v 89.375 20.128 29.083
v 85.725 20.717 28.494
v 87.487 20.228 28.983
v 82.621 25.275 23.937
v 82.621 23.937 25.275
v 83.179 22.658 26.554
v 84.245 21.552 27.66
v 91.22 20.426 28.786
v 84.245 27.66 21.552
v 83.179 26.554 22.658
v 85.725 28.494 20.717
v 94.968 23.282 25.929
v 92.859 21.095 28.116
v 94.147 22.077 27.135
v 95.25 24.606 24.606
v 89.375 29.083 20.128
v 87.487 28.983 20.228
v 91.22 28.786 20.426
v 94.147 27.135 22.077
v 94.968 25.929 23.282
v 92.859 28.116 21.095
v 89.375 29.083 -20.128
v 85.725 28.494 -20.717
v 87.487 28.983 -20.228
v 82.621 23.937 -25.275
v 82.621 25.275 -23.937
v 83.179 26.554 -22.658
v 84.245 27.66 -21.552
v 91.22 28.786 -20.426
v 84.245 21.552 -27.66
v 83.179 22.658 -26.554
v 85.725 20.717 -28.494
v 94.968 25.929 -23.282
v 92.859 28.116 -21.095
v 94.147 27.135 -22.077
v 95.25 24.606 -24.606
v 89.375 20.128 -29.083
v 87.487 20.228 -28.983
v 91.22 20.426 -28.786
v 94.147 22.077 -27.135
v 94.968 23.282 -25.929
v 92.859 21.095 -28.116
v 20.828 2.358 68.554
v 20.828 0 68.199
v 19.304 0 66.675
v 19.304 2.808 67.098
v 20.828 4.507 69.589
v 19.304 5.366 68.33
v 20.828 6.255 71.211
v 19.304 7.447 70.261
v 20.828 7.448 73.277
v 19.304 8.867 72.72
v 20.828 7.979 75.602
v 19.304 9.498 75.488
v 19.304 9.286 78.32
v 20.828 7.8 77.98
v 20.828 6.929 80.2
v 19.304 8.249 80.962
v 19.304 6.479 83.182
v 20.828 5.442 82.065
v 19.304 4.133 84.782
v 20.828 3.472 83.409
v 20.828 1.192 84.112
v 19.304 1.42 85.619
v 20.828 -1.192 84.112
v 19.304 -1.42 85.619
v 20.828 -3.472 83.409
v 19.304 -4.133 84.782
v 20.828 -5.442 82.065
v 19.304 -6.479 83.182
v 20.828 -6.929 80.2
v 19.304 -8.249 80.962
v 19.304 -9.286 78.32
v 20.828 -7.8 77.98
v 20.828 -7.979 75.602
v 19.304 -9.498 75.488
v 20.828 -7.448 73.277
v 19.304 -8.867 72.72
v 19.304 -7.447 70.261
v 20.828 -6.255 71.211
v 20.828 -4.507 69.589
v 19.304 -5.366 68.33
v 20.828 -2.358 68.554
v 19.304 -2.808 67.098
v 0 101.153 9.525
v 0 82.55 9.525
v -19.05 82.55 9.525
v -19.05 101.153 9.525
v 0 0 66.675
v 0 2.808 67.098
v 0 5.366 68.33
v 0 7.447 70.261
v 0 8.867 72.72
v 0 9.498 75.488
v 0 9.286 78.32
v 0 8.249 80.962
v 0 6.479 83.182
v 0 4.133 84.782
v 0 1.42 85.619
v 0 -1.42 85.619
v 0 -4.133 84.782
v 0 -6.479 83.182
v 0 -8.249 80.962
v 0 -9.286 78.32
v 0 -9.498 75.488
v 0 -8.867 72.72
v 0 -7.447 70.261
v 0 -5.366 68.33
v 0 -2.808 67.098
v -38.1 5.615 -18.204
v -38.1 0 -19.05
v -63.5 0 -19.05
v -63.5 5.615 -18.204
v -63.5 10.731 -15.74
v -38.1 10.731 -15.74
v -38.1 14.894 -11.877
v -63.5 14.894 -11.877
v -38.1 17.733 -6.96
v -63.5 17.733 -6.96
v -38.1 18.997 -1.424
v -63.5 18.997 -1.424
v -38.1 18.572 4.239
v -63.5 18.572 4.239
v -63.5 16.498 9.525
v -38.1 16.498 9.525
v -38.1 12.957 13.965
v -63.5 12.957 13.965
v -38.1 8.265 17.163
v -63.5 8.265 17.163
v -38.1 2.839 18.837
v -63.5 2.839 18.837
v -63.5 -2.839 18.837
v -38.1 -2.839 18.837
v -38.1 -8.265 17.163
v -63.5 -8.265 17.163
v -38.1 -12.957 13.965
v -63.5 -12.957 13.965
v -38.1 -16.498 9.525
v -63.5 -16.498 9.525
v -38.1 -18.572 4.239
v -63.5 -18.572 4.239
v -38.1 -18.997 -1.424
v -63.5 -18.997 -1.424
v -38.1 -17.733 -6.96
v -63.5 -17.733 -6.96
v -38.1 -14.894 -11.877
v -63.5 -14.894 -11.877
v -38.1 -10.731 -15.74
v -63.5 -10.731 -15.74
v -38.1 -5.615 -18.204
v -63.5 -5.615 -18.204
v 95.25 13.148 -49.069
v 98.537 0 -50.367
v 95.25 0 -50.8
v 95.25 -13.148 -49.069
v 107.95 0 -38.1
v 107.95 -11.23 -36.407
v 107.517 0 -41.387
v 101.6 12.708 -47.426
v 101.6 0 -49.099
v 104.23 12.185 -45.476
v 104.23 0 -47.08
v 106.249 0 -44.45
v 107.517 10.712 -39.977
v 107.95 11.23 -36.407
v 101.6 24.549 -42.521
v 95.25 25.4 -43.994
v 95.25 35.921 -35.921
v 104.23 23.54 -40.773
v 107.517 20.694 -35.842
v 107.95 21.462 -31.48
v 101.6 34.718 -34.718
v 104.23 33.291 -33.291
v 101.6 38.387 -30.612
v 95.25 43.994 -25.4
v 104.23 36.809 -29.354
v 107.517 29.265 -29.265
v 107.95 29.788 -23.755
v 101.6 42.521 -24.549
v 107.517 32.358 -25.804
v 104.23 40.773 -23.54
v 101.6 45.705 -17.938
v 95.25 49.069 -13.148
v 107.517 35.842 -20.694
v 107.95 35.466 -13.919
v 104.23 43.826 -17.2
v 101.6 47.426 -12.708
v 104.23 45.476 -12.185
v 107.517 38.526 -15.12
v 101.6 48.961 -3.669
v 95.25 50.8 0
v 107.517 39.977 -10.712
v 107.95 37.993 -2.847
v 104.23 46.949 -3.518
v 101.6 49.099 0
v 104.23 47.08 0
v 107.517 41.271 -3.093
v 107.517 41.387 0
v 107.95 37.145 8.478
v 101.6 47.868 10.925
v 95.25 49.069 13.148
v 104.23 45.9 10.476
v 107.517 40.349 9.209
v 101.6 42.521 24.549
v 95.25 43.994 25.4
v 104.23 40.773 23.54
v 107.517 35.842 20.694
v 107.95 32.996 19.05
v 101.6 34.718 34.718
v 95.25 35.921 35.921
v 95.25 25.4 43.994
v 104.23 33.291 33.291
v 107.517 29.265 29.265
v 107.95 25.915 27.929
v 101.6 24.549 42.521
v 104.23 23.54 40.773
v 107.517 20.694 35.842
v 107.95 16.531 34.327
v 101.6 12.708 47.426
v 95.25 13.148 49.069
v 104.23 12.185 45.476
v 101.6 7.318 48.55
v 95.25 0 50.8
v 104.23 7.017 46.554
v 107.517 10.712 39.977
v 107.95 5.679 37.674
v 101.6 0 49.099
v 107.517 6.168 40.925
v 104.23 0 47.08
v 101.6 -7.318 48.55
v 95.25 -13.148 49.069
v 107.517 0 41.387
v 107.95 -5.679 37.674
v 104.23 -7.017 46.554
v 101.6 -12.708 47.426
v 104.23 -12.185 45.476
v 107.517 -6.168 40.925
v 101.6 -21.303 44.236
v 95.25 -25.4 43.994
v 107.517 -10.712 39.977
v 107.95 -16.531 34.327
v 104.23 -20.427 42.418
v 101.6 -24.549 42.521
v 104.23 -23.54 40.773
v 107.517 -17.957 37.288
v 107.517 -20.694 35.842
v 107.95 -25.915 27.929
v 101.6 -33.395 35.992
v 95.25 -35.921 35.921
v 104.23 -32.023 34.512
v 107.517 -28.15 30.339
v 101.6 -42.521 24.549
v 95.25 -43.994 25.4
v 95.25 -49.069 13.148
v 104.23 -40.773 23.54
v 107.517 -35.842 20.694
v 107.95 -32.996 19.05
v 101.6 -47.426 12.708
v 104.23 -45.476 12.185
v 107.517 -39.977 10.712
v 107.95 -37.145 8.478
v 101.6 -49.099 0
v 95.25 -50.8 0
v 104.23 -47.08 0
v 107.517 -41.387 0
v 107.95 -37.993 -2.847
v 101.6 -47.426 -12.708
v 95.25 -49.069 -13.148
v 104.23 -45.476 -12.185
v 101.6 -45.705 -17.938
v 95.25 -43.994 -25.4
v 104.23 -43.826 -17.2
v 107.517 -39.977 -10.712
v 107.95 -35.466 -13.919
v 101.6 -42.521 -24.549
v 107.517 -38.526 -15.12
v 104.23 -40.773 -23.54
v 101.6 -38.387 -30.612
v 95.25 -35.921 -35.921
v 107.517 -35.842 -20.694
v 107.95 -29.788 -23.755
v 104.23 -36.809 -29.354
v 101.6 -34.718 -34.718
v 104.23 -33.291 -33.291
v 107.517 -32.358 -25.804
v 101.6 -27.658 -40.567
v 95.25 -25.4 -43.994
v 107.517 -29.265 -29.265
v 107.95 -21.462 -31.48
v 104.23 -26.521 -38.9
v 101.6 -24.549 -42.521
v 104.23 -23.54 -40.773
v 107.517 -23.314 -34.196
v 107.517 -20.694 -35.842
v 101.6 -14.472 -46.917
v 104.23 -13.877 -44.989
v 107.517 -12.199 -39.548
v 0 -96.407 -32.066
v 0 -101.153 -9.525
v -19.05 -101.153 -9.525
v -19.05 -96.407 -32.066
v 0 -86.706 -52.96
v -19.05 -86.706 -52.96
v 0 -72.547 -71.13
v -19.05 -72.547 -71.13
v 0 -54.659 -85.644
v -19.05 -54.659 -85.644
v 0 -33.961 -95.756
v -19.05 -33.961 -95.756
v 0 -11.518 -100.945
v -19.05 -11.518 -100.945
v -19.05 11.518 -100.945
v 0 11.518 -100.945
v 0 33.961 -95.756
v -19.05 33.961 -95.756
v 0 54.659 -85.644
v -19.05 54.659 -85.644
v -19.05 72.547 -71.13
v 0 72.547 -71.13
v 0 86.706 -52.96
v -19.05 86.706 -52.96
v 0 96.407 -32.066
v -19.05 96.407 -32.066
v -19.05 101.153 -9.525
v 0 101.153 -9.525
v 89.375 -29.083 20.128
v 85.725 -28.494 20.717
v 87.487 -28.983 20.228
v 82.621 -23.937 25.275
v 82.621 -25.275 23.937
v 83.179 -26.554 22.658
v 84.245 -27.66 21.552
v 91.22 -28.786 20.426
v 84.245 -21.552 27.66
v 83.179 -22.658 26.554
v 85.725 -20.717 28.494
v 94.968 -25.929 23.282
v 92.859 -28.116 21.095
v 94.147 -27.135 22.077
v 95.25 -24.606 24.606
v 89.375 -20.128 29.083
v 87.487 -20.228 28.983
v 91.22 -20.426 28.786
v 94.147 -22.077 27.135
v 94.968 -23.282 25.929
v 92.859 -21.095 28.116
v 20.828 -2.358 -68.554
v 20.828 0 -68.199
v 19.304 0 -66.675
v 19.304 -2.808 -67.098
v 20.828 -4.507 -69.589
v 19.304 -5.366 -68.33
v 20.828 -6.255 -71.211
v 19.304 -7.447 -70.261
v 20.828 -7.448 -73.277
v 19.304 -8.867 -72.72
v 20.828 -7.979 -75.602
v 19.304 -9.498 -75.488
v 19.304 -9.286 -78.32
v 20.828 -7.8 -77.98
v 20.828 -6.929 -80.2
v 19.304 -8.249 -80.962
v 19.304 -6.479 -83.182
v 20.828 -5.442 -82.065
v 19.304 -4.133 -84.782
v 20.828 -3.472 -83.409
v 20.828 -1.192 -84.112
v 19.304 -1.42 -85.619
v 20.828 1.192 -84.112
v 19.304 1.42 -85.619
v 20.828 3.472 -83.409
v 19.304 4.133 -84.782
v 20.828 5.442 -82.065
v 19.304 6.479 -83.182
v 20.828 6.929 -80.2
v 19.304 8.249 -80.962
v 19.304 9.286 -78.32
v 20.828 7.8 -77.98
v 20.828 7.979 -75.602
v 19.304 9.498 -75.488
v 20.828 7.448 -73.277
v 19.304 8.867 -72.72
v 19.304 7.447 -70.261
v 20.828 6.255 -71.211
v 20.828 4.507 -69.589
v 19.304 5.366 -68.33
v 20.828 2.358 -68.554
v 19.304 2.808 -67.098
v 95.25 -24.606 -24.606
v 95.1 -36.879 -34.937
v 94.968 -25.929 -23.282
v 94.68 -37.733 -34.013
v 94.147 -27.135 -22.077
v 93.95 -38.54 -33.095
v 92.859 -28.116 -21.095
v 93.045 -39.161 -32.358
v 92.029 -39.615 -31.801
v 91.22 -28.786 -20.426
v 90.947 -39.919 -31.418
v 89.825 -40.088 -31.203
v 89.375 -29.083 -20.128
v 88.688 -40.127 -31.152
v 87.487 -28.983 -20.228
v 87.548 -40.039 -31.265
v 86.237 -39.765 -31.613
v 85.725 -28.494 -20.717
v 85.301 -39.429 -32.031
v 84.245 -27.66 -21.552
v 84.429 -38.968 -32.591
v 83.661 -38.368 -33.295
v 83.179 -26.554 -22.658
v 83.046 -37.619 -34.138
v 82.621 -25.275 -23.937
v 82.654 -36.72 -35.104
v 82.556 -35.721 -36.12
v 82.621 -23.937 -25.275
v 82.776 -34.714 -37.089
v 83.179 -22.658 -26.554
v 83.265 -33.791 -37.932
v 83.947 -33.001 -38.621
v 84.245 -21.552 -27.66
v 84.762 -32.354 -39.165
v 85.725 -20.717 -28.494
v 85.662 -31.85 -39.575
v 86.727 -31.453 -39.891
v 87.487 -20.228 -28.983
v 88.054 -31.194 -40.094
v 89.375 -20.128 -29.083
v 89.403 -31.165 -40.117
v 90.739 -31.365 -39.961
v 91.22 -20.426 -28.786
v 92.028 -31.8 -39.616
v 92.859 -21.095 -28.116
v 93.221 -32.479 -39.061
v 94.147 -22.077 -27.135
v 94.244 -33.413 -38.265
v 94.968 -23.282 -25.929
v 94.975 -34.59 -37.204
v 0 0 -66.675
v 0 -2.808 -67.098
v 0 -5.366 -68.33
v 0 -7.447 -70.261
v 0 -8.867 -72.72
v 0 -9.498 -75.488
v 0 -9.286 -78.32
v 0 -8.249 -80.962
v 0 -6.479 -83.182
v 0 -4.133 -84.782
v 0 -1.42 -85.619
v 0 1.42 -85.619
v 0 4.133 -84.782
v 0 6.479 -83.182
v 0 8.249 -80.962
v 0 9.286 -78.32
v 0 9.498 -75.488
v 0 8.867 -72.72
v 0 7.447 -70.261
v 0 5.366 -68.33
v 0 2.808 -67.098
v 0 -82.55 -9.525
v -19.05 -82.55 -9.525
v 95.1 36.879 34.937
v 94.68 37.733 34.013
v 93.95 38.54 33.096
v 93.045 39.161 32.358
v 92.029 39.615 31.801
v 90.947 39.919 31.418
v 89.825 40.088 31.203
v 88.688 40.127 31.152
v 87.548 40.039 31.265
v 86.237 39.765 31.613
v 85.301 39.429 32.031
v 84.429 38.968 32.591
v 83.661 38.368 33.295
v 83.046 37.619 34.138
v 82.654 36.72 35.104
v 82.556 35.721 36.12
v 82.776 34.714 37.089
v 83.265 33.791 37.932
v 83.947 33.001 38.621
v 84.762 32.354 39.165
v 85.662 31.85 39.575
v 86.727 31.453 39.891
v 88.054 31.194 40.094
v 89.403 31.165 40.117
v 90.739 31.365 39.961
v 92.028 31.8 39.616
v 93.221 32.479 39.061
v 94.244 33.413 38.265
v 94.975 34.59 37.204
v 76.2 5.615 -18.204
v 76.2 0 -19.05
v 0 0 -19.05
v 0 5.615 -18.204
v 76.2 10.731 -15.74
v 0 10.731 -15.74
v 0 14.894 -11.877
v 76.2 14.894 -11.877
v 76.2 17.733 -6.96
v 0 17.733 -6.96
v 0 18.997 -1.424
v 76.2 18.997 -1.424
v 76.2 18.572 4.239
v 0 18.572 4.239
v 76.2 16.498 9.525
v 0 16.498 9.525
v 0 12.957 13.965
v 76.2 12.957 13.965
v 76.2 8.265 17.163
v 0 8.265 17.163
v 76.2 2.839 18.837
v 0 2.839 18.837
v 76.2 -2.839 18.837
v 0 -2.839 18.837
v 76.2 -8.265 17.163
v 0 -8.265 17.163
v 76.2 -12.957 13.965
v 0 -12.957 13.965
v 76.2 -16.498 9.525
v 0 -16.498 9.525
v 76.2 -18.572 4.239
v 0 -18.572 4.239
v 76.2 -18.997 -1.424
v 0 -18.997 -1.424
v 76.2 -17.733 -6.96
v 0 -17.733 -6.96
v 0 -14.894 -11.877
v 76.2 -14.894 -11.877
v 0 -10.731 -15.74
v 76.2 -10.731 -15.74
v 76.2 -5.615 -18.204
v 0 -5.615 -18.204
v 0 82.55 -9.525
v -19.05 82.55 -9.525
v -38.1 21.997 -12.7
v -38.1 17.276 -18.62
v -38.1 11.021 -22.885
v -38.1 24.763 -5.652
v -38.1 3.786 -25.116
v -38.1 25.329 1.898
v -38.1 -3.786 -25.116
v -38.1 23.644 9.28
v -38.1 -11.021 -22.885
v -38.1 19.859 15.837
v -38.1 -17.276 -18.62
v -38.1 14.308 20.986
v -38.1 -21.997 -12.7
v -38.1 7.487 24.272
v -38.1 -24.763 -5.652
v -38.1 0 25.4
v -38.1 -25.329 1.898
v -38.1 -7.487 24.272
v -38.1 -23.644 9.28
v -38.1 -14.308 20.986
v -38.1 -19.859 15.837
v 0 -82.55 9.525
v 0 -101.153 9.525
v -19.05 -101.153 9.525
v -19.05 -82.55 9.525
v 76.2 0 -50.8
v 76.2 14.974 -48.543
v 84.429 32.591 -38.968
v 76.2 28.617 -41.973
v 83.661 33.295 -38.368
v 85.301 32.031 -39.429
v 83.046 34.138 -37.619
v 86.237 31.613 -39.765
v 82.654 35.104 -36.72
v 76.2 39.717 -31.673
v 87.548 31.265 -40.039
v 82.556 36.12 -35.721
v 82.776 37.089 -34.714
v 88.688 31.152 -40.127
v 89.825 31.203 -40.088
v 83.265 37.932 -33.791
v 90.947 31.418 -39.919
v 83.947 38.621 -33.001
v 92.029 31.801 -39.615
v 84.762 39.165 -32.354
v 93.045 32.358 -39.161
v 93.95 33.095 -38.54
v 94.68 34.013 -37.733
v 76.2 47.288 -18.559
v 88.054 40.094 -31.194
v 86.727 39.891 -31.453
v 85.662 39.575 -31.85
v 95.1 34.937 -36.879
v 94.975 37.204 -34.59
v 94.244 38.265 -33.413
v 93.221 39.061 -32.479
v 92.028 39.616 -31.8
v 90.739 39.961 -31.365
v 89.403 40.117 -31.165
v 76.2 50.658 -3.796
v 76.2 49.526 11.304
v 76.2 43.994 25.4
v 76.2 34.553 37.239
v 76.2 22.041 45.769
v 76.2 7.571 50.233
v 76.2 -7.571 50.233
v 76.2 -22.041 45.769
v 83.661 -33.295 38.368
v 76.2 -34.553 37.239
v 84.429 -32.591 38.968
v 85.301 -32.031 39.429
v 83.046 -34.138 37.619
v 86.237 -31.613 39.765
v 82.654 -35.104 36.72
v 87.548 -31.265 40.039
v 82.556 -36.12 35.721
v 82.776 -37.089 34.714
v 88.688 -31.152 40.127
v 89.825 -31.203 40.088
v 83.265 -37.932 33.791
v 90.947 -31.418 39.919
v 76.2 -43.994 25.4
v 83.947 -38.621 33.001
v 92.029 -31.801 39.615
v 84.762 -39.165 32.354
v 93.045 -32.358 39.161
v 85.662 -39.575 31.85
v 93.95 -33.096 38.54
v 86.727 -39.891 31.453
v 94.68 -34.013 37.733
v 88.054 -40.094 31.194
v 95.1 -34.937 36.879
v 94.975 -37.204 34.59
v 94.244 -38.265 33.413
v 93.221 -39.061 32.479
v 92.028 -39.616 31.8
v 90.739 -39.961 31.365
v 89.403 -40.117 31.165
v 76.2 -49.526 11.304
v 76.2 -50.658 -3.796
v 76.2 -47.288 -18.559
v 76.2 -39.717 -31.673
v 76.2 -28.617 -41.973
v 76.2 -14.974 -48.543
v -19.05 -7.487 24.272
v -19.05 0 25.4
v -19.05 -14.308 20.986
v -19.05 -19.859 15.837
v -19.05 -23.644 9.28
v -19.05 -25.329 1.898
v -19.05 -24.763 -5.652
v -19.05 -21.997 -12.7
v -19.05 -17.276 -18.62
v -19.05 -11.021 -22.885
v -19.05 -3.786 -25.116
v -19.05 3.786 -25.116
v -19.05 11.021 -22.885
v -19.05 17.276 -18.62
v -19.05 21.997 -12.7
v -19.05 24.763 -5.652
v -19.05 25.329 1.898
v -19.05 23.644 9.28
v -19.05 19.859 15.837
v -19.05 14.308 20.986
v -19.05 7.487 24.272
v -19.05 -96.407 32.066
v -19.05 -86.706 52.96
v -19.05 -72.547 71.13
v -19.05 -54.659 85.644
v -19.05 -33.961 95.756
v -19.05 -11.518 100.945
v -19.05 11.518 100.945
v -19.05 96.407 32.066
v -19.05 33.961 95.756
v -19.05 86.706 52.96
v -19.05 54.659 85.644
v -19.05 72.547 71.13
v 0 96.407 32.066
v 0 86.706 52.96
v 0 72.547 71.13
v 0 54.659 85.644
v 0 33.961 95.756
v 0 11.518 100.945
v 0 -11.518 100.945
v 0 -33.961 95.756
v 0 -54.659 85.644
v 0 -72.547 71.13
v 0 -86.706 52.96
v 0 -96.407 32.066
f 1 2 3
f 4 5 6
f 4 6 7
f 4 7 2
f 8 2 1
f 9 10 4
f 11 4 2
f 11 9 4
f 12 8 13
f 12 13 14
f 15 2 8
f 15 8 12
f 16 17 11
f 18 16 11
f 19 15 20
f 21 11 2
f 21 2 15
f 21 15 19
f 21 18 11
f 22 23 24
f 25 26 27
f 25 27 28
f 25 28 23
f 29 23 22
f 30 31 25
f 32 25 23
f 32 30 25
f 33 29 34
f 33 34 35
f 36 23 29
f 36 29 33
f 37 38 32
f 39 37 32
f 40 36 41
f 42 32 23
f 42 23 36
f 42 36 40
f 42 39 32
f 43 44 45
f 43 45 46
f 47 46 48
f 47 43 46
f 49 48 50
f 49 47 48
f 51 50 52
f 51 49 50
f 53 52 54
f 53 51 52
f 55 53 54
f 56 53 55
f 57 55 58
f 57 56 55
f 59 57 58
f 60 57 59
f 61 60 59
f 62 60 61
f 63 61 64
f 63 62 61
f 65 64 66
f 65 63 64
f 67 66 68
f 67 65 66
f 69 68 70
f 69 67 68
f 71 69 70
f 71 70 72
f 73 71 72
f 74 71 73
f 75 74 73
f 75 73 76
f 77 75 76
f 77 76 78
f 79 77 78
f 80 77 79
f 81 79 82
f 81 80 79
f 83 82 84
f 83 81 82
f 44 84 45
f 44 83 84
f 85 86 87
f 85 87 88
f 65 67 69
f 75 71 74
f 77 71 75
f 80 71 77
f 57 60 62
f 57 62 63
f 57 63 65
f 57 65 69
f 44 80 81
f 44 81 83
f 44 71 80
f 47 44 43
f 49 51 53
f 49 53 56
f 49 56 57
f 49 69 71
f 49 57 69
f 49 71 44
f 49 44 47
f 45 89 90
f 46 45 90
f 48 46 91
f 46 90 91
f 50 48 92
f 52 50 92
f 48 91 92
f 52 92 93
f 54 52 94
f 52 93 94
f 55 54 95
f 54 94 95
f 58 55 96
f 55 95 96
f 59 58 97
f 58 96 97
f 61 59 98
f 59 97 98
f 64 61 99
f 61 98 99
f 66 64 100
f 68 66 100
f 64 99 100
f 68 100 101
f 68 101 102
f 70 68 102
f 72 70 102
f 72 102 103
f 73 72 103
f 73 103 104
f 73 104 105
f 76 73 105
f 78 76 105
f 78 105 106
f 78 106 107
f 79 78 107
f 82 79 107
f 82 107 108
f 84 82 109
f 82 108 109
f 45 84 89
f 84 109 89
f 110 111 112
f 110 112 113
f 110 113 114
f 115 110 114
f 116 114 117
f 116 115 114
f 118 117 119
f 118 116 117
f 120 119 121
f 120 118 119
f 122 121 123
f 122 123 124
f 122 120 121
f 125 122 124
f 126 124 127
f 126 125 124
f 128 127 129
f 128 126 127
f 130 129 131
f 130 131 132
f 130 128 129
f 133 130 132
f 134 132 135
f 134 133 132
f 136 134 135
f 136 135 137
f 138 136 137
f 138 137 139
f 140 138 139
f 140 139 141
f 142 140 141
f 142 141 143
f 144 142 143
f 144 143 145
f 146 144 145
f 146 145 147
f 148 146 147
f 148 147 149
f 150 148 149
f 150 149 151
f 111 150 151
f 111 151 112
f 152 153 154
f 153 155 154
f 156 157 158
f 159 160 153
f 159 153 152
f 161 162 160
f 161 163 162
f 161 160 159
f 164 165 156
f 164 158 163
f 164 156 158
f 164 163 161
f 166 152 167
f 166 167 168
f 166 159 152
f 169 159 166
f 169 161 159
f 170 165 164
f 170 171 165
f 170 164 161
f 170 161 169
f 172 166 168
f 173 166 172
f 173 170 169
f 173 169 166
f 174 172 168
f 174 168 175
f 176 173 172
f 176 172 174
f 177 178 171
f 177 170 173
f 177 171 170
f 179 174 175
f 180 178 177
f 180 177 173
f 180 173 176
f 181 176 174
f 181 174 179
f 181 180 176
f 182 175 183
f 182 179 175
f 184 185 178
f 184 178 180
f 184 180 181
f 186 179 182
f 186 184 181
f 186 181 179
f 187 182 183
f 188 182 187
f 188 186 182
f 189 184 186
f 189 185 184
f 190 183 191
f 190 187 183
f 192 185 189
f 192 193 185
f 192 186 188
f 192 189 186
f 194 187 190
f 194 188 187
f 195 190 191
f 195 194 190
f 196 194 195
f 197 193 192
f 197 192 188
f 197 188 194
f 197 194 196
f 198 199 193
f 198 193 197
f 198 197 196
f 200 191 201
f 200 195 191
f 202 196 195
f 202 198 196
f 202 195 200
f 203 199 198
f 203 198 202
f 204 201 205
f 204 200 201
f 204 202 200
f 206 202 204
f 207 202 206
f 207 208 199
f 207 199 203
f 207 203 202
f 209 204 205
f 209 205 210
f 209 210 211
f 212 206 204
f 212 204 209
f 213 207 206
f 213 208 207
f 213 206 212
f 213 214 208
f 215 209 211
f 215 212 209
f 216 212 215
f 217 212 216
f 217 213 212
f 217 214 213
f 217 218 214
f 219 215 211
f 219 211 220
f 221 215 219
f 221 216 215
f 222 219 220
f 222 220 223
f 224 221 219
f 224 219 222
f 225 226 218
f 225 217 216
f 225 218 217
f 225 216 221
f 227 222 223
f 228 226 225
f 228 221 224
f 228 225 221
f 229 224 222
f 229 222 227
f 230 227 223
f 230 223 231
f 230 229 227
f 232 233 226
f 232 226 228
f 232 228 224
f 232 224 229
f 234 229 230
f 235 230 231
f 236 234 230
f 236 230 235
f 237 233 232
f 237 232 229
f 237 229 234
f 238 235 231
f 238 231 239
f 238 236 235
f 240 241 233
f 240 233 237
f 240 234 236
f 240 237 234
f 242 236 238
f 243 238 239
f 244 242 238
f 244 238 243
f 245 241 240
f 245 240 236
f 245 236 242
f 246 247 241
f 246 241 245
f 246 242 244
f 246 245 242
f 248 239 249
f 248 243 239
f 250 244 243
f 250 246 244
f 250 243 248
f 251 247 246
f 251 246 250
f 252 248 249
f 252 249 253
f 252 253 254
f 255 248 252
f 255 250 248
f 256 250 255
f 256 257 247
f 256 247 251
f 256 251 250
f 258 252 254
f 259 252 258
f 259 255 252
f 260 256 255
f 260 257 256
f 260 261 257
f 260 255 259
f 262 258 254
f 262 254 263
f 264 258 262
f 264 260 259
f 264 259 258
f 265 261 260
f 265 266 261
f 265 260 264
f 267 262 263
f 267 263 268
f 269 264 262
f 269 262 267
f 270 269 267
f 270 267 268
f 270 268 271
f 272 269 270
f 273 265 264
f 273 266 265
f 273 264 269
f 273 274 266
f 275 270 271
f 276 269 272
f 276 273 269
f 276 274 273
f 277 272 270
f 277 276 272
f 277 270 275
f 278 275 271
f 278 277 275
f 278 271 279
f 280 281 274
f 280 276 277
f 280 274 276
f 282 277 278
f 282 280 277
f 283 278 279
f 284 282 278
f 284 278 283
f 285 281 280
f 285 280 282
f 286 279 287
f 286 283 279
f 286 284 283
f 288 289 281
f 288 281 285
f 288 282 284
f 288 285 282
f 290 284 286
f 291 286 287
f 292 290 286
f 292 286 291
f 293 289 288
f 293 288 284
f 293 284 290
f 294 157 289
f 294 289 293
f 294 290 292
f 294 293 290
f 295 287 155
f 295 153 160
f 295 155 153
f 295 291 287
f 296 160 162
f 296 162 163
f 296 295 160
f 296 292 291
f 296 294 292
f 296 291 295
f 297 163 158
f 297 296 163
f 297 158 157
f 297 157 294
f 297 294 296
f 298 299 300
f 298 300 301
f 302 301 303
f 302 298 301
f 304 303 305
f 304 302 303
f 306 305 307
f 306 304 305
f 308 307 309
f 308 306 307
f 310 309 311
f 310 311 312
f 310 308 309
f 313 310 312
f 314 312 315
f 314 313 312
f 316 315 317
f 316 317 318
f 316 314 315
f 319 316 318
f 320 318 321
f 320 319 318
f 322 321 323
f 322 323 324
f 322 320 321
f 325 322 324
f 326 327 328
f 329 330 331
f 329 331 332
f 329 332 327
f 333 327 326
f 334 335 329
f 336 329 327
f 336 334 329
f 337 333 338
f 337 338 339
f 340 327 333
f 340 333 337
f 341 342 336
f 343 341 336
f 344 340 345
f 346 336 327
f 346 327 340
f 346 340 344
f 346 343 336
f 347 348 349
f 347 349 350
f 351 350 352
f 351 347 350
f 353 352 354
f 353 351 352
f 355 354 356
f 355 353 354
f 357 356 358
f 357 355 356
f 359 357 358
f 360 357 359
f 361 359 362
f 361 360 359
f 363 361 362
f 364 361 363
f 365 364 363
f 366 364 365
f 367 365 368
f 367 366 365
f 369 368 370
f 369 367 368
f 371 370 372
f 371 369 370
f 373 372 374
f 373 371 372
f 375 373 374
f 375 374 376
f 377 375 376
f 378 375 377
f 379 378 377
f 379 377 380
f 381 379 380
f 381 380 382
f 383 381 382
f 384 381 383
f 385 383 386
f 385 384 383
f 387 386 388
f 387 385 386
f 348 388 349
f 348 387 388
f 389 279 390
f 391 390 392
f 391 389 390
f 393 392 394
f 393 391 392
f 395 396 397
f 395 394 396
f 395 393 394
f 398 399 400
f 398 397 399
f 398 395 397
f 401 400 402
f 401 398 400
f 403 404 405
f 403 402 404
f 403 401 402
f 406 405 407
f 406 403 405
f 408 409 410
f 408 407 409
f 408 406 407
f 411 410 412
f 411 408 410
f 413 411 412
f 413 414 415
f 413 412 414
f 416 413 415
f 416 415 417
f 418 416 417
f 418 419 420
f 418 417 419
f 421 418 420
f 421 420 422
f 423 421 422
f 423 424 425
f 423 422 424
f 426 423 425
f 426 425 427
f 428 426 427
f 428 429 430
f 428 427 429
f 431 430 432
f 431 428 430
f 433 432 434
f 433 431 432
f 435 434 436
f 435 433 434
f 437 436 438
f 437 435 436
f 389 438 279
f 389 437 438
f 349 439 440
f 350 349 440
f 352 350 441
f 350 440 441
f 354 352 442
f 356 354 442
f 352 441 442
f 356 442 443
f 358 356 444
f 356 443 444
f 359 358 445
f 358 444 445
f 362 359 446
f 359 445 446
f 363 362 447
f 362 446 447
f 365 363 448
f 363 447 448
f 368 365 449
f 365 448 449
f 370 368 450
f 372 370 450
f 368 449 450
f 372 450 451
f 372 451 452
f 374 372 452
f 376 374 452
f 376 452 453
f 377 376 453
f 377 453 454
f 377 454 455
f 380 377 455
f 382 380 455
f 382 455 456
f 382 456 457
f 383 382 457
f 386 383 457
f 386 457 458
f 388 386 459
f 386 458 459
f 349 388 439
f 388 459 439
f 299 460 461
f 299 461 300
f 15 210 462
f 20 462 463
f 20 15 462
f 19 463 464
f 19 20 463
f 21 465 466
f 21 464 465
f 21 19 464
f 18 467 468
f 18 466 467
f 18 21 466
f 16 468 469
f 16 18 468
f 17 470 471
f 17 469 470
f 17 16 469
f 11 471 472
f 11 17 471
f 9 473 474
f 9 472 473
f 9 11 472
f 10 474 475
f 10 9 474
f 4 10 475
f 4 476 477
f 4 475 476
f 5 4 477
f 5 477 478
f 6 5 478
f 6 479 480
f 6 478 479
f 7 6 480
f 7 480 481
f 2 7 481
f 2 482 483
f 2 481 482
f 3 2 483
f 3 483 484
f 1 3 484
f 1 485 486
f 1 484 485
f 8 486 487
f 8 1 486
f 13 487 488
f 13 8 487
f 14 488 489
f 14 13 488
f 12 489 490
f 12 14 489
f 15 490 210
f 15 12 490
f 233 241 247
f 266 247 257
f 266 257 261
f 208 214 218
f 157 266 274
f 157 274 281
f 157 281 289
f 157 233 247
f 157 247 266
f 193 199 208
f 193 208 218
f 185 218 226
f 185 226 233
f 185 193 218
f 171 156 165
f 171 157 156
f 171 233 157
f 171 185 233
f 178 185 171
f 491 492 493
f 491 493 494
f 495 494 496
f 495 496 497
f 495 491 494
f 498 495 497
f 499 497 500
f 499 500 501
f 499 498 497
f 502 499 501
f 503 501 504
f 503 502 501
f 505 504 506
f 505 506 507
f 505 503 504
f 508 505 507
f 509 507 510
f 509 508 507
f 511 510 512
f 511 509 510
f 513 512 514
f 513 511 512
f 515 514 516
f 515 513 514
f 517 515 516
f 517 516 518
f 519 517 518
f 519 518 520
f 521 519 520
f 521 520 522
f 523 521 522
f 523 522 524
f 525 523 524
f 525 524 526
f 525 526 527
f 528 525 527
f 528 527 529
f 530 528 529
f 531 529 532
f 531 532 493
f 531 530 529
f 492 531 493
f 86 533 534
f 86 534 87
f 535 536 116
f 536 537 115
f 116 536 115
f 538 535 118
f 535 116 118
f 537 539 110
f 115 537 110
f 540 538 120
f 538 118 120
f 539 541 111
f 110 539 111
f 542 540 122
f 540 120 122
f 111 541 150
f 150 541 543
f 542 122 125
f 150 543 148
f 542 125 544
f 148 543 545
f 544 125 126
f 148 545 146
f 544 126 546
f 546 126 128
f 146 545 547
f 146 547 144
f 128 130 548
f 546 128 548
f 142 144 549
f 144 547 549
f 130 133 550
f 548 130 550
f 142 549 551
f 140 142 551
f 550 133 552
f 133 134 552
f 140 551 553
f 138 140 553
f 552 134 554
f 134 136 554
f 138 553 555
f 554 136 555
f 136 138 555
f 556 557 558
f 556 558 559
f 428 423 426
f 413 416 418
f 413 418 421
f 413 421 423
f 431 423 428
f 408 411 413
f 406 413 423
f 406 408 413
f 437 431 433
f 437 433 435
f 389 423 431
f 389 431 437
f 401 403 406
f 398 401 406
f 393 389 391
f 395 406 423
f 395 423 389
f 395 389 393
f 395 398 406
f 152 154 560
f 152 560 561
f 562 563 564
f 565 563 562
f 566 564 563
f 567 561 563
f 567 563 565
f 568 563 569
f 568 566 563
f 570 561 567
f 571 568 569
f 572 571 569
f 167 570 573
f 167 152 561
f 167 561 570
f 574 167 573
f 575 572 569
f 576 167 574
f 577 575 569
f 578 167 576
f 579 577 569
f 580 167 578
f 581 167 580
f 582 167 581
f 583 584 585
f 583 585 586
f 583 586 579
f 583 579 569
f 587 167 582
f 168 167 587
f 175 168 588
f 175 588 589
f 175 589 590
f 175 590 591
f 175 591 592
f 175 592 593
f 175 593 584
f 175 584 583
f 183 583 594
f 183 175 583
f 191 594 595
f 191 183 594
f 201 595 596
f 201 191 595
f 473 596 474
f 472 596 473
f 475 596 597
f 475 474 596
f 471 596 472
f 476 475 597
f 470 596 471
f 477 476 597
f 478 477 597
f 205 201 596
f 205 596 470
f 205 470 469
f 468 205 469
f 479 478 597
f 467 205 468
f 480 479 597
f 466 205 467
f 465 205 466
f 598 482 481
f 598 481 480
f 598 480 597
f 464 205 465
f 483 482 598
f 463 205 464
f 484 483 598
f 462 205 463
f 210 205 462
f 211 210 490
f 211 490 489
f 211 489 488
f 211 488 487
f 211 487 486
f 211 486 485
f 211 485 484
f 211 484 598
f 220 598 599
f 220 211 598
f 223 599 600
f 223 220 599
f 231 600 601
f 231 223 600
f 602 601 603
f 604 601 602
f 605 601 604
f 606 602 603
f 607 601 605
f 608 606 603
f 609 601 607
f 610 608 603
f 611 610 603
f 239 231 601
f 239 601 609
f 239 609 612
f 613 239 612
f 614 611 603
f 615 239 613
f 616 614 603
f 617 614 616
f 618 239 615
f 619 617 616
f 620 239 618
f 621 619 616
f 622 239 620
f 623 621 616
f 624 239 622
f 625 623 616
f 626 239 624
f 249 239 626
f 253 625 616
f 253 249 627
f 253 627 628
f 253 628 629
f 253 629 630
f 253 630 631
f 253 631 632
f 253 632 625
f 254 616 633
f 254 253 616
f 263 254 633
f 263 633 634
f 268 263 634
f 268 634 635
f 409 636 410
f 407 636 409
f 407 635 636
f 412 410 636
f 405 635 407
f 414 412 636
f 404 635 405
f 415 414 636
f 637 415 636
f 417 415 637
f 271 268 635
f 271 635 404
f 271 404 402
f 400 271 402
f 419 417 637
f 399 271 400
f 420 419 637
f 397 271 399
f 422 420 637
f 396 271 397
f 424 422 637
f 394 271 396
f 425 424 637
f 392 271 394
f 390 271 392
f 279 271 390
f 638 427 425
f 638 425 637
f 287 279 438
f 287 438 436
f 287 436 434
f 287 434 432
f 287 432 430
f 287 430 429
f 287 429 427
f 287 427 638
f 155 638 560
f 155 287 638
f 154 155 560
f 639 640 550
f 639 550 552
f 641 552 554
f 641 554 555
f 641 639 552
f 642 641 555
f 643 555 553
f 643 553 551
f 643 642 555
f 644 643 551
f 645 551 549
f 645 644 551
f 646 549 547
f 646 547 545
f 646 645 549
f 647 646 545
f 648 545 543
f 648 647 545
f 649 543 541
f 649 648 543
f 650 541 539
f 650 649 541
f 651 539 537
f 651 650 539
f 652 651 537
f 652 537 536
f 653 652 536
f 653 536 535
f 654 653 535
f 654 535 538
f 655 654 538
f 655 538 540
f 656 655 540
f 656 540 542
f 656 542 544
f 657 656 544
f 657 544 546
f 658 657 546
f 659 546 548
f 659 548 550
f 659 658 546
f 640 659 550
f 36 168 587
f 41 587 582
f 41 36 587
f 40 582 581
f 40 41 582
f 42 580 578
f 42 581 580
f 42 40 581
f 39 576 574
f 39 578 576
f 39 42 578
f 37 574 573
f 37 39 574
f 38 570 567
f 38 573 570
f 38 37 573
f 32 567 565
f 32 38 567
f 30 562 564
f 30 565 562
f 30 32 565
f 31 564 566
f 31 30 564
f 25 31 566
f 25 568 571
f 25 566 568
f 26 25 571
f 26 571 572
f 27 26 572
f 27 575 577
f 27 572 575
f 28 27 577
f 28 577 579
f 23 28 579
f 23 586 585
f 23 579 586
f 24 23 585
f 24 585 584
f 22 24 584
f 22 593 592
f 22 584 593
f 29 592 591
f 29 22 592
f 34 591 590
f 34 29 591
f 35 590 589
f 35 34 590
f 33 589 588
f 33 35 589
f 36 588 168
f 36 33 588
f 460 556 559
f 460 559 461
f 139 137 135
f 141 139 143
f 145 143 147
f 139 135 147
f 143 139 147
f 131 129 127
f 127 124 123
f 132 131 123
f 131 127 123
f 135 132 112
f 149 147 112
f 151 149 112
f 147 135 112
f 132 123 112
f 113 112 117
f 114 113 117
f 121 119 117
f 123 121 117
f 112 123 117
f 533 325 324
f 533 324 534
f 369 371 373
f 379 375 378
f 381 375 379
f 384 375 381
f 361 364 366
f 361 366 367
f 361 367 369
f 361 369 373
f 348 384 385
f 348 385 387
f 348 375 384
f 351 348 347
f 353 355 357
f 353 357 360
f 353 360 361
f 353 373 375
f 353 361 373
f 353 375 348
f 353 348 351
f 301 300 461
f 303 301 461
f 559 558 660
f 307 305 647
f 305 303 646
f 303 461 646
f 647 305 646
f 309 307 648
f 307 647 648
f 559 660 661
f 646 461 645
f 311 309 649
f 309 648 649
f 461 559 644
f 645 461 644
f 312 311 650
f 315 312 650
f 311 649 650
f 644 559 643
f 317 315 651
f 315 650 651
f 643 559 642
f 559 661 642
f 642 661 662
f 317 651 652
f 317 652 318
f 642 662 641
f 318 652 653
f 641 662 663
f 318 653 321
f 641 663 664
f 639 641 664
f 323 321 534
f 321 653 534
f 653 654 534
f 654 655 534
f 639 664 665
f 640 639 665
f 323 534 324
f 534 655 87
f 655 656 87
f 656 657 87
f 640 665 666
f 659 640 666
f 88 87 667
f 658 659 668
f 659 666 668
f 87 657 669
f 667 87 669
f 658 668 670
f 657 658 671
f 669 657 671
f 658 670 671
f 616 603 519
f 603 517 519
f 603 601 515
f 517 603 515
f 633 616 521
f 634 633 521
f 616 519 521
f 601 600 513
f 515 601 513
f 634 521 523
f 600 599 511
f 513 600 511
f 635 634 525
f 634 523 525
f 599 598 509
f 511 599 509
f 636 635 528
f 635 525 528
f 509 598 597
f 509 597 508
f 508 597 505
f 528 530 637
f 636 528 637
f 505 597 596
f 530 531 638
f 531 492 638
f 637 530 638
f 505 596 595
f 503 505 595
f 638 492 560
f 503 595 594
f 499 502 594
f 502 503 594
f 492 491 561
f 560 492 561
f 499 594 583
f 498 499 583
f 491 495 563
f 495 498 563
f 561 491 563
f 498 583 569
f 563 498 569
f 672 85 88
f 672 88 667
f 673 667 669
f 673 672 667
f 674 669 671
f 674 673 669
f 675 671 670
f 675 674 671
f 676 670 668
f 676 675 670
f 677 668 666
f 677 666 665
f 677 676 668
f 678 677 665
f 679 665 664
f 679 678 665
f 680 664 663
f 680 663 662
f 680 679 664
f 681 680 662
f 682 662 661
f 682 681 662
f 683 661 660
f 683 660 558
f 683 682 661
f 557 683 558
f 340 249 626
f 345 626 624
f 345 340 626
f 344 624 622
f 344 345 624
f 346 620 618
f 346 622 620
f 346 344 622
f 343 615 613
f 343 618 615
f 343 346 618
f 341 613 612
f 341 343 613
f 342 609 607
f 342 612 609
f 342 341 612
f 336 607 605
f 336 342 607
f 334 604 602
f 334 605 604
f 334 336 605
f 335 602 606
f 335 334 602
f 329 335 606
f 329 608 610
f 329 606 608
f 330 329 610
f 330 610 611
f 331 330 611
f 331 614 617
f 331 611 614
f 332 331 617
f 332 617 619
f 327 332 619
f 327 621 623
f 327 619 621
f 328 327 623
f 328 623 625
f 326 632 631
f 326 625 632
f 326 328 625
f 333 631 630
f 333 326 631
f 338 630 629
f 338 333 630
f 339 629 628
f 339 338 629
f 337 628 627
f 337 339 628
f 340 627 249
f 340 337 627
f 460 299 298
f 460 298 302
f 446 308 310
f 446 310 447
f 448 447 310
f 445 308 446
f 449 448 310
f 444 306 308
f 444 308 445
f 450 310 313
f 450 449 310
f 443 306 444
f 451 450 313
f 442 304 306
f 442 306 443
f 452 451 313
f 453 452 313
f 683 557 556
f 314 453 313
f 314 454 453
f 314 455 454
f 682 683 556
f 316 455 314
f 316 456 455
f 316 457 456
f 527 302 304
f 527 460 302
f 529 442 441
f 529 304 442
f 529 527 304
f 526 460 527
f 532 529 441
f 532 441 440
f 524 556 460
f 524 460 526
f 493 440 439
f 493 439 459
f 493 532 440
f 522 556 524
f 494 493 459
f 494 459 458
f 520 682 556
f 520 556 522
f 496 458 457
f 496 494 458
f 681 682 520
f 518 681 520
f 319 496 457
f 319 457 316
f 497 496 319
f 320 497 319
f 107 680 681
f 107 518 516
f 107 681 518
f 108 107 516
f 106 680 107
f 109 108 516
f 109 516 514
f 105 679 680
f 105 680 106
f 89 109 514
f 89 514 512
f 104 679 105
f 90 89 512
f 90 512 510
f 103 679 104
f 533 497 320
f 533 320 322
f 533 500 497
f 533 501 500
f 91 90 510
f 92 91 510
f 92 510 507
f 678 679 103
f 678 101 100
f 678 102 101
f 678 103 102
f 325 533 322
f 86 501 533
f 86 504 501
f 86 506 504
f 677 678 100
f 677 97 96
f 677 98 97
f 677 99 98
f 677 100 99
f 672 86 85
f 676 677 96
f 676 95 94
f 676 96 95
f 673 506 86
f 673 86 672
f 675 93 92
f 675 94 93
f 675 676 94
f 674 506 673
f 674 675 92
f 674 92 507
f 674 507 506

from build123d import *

# Parameters (mm, degrees)
BOSS_EXTRUDE1_DEPTH          = 19.05
SKETCH1_3_R                  = 9.525
BOSS_EXTRUDE2_DEPTH          = 20.828
CHAMFER1_SIZE                = 1.524
BOSS_EXTRUDE3_START          = -19.05
SKETCH1_4_R                  = 19.05
BOSS_EXTRUDE3_DEPTH          = 44.45
BOSS_EXTRUDE4_START          = -19.05
SKETCH1_6_R                  = 25.4
SKETCH1_6_R_2                = 19.05
BOSS_EXTRUDE4_DEPTH          = 19.05
BOSS_EXTRUDE5_START          = 76.2
SKETCH1_7_R                  = 19.05
BOSS_EXTRUDE5_DEPTH          = 76.2
BOSS_EXTRUDE6_START          = 107.95
SKETCH1_8_R                  = 50.8
SKETCH1_8_R_2                = 25.4
SKETCH1_8_R_3                = 19.05
BOSS_EXTRUDE6_DEPTH          = 31.75
CIRPATTERN2_COUNT            = 2
CHAMFER1_OF_CIRPATTERN2_SIZE = 1.524
FILLET1_R                    = 12.7
CUT_REVOLVE1_START           = 34.798
CUT_REVOLVE1_OUTLINE_R       = 6.35
CUT_REVOLVE1_DEPTH           = 16.0020001
CIRPATTERN3_COUNT            = 4


# Read off the part's stored shape, not the designer's step: Cut-Revolve1
with BuildPart() as part:
    # Sketch1 → Boss-Extrude1 (new body)
    with BuildSketch(Plane.YZ):
        with BuildLine():
            ThreePointArc((-101.152530245, -9.525), (0, -101.6), (101.152530245, -9.525))
            Line((101.152530245, -9.525), (82.55, -9.525))
            Line((82.55, -9.525), (82.55, 9.525))
            Line((82.55, 9.525), (101.152530245, 9.525))
            ThreePointArc((101.152530245, 9.525), (0, 101.6), (-101.152530245, 9.525))
            Line((-101.152530245, 9.525), (-82.55, 9.525))
            Line((-82.55, 9.525), (-82.55, -9.525))
            Line((-82.55, -9.525), (-101.152530245, -9.525))
        make_face()
    extrude(amount=-BOSS_EXTRUDE1_DEPTH)

    # Sketch1<3> → Boss-Extrude2 (add)
    with BuildSketch(Plane.YZ):
        with Locations(Location((0, 76.2, 0), (0, 0, 270))):
            Circle(SKETCH1_3_R)
    boss_extrude2 = extrude(amount=BOSS_EXTRUDE2_DEPTH)

    # Chamfer1
    chamfer1_edges = [part.edges().sort_by_distance(p)[0] for p in [
        (20.828, 0, 85.725),
    ]]
    chamfer(chamfer1_edges, length=CHAMFER1_SIZE)

    # Sketch1<4> → Boss-Extrude3 (add)
    with BuildSketch(Plane.YZ.offset(BOSS_EXTRUDE3_START)):
        with Locations(Location((0, 0, 0), (0, 0, 270))):
            Circle(SKETCH1_4_R)
    extrude(amount=-BOSS_EXTRUDE3_DEPTH)

    # Sketch1<6> → Boss-Extrude4 (add)
    with BuildSketch(Plane.YZ.offset(BOSS_EXTRUDE4_START)):
        with Locations(Location((0, 0, 0), (0, 0, 90))):
            Circle(SKETCH1_6_R)
        with Locations(Location((0, 0, 0), (0, 0, 270))):
            Circle(SKETCH1_6_R_2, mode=Mode.SUBTRACT)
    extrude(amount=-BOSS_EXTRUDE4_DEPTH)

    # Sketch1<7> → Boss-Extrude5 (add)
    with BuildSketch(Plane.YZ.offset(BOSS_EXTRUDE5_START)):
        with Locations(Location((0, 0, 0), (0, 0, 270))):
            Circle(SKETCH1_7_R)
    extrude(amount=-BOSS_EXTRUDE5_DEPTH)

    # Sketch1<8> → Boss-Extrude6 (add)
    # profile 1 of 3: a face of its own
    with BuildSketch(Plane.YZ.offset(BOSS_EXTRUDE6_START)):
        with Locations(Location((0, 0, 0), (0, 0, 270))):
            Circle(SKETCH1_8_R)
        with Locations(Location((0, 0, 0), (0, 0, 90))):
            Circle(SKETCH1_8_R_2, mode=Mode.SUBTRACT)
    # profile 2 of 3: a face of its own
    with BuildSketch(Plane.YZ.offset(BOSS_EXTRUDE6_START)):
        with Locations(Location((0, 0, 0), (0, 0, 90))):
            Circle(SKETCH1_8_R_2)
        with Locations(Location((0, 0, 0), (0, 0, 270))):
            Circle(SKETCH1_8_R_3, mode=Mode.SUBTRACT)
    # profile 3 of 3: a face of its own
    with BuildSketch(Plane.YZ.offset(BOSS_EXTRUDE6_START)):
        with Locations(Location((0, 0, 0), (0, 0, 270))):
            Circle(SKETCH1_8_R_3)
    extrude(amount=-BOSS_EXTRUDE6_DEPTH)

    # CirPattern2: Boss-Extrude2 ×2 about axis
    cirpattern2_axis = Axis((0, 0, 0), (1, 0, 0))
    for i in range(1, CIRPATTERN2_COUNT):
        add(boss_extrude2.rotate(cirpattern2_axis, i * 360 / CIRPATTERN2_COUNT))

    # Chamfer1 of CirPattern2
    chamfer1_of_cirpattern2_edges = [part.edges().sort_by_distance(p)[0] for p in [
        (20.828, 0, -85.725),
    ]]
    chamfer(chamfer1_of_cirpattern2_edges, length=CHAMFER1_OF_CIRPATTERN2_SIZE)

    # Fillet1
    fillet1_edges = [part.edges().sort_by_distance(p)[0] for p in [
        (107.95, 0, 50.8),
    ]]
    fillet(fillet1_edges, radius=FILLET1_R)

    # Cut-Revolve1 outline → Cut-Revolve1 (cut)
    with BuildSketch(Plane(origin=(0, 0, 0), x_dir=(1, 0, 0), z_dir=(0, 0.707106781186549, -0.707106781186546)).offset(CUT_REVOLVE1_START)):
        with Locations((88.9, 0)):
            Circle(CUT_REVOLVE1_OUTLINE_R)
    cut_revolve1 = extrude(amount=CUT_REVOLVE1_DEPTH, mode=Mode.SUBTRACT)

    # CirPattern3: Cut-Revolve1 ×4 about axis
    cirpattern3_axis = Axis((0, 0, 0), (1, 0, 0))
    for i in range(1, CIRPATTERN3_COUNT):
        add(cut_revolve1.rotate(cirpattern3_axis, i * 360 / CIRPATTERN3_COUNT), mode=Mode.SUBTRACT)


solid = part.part
